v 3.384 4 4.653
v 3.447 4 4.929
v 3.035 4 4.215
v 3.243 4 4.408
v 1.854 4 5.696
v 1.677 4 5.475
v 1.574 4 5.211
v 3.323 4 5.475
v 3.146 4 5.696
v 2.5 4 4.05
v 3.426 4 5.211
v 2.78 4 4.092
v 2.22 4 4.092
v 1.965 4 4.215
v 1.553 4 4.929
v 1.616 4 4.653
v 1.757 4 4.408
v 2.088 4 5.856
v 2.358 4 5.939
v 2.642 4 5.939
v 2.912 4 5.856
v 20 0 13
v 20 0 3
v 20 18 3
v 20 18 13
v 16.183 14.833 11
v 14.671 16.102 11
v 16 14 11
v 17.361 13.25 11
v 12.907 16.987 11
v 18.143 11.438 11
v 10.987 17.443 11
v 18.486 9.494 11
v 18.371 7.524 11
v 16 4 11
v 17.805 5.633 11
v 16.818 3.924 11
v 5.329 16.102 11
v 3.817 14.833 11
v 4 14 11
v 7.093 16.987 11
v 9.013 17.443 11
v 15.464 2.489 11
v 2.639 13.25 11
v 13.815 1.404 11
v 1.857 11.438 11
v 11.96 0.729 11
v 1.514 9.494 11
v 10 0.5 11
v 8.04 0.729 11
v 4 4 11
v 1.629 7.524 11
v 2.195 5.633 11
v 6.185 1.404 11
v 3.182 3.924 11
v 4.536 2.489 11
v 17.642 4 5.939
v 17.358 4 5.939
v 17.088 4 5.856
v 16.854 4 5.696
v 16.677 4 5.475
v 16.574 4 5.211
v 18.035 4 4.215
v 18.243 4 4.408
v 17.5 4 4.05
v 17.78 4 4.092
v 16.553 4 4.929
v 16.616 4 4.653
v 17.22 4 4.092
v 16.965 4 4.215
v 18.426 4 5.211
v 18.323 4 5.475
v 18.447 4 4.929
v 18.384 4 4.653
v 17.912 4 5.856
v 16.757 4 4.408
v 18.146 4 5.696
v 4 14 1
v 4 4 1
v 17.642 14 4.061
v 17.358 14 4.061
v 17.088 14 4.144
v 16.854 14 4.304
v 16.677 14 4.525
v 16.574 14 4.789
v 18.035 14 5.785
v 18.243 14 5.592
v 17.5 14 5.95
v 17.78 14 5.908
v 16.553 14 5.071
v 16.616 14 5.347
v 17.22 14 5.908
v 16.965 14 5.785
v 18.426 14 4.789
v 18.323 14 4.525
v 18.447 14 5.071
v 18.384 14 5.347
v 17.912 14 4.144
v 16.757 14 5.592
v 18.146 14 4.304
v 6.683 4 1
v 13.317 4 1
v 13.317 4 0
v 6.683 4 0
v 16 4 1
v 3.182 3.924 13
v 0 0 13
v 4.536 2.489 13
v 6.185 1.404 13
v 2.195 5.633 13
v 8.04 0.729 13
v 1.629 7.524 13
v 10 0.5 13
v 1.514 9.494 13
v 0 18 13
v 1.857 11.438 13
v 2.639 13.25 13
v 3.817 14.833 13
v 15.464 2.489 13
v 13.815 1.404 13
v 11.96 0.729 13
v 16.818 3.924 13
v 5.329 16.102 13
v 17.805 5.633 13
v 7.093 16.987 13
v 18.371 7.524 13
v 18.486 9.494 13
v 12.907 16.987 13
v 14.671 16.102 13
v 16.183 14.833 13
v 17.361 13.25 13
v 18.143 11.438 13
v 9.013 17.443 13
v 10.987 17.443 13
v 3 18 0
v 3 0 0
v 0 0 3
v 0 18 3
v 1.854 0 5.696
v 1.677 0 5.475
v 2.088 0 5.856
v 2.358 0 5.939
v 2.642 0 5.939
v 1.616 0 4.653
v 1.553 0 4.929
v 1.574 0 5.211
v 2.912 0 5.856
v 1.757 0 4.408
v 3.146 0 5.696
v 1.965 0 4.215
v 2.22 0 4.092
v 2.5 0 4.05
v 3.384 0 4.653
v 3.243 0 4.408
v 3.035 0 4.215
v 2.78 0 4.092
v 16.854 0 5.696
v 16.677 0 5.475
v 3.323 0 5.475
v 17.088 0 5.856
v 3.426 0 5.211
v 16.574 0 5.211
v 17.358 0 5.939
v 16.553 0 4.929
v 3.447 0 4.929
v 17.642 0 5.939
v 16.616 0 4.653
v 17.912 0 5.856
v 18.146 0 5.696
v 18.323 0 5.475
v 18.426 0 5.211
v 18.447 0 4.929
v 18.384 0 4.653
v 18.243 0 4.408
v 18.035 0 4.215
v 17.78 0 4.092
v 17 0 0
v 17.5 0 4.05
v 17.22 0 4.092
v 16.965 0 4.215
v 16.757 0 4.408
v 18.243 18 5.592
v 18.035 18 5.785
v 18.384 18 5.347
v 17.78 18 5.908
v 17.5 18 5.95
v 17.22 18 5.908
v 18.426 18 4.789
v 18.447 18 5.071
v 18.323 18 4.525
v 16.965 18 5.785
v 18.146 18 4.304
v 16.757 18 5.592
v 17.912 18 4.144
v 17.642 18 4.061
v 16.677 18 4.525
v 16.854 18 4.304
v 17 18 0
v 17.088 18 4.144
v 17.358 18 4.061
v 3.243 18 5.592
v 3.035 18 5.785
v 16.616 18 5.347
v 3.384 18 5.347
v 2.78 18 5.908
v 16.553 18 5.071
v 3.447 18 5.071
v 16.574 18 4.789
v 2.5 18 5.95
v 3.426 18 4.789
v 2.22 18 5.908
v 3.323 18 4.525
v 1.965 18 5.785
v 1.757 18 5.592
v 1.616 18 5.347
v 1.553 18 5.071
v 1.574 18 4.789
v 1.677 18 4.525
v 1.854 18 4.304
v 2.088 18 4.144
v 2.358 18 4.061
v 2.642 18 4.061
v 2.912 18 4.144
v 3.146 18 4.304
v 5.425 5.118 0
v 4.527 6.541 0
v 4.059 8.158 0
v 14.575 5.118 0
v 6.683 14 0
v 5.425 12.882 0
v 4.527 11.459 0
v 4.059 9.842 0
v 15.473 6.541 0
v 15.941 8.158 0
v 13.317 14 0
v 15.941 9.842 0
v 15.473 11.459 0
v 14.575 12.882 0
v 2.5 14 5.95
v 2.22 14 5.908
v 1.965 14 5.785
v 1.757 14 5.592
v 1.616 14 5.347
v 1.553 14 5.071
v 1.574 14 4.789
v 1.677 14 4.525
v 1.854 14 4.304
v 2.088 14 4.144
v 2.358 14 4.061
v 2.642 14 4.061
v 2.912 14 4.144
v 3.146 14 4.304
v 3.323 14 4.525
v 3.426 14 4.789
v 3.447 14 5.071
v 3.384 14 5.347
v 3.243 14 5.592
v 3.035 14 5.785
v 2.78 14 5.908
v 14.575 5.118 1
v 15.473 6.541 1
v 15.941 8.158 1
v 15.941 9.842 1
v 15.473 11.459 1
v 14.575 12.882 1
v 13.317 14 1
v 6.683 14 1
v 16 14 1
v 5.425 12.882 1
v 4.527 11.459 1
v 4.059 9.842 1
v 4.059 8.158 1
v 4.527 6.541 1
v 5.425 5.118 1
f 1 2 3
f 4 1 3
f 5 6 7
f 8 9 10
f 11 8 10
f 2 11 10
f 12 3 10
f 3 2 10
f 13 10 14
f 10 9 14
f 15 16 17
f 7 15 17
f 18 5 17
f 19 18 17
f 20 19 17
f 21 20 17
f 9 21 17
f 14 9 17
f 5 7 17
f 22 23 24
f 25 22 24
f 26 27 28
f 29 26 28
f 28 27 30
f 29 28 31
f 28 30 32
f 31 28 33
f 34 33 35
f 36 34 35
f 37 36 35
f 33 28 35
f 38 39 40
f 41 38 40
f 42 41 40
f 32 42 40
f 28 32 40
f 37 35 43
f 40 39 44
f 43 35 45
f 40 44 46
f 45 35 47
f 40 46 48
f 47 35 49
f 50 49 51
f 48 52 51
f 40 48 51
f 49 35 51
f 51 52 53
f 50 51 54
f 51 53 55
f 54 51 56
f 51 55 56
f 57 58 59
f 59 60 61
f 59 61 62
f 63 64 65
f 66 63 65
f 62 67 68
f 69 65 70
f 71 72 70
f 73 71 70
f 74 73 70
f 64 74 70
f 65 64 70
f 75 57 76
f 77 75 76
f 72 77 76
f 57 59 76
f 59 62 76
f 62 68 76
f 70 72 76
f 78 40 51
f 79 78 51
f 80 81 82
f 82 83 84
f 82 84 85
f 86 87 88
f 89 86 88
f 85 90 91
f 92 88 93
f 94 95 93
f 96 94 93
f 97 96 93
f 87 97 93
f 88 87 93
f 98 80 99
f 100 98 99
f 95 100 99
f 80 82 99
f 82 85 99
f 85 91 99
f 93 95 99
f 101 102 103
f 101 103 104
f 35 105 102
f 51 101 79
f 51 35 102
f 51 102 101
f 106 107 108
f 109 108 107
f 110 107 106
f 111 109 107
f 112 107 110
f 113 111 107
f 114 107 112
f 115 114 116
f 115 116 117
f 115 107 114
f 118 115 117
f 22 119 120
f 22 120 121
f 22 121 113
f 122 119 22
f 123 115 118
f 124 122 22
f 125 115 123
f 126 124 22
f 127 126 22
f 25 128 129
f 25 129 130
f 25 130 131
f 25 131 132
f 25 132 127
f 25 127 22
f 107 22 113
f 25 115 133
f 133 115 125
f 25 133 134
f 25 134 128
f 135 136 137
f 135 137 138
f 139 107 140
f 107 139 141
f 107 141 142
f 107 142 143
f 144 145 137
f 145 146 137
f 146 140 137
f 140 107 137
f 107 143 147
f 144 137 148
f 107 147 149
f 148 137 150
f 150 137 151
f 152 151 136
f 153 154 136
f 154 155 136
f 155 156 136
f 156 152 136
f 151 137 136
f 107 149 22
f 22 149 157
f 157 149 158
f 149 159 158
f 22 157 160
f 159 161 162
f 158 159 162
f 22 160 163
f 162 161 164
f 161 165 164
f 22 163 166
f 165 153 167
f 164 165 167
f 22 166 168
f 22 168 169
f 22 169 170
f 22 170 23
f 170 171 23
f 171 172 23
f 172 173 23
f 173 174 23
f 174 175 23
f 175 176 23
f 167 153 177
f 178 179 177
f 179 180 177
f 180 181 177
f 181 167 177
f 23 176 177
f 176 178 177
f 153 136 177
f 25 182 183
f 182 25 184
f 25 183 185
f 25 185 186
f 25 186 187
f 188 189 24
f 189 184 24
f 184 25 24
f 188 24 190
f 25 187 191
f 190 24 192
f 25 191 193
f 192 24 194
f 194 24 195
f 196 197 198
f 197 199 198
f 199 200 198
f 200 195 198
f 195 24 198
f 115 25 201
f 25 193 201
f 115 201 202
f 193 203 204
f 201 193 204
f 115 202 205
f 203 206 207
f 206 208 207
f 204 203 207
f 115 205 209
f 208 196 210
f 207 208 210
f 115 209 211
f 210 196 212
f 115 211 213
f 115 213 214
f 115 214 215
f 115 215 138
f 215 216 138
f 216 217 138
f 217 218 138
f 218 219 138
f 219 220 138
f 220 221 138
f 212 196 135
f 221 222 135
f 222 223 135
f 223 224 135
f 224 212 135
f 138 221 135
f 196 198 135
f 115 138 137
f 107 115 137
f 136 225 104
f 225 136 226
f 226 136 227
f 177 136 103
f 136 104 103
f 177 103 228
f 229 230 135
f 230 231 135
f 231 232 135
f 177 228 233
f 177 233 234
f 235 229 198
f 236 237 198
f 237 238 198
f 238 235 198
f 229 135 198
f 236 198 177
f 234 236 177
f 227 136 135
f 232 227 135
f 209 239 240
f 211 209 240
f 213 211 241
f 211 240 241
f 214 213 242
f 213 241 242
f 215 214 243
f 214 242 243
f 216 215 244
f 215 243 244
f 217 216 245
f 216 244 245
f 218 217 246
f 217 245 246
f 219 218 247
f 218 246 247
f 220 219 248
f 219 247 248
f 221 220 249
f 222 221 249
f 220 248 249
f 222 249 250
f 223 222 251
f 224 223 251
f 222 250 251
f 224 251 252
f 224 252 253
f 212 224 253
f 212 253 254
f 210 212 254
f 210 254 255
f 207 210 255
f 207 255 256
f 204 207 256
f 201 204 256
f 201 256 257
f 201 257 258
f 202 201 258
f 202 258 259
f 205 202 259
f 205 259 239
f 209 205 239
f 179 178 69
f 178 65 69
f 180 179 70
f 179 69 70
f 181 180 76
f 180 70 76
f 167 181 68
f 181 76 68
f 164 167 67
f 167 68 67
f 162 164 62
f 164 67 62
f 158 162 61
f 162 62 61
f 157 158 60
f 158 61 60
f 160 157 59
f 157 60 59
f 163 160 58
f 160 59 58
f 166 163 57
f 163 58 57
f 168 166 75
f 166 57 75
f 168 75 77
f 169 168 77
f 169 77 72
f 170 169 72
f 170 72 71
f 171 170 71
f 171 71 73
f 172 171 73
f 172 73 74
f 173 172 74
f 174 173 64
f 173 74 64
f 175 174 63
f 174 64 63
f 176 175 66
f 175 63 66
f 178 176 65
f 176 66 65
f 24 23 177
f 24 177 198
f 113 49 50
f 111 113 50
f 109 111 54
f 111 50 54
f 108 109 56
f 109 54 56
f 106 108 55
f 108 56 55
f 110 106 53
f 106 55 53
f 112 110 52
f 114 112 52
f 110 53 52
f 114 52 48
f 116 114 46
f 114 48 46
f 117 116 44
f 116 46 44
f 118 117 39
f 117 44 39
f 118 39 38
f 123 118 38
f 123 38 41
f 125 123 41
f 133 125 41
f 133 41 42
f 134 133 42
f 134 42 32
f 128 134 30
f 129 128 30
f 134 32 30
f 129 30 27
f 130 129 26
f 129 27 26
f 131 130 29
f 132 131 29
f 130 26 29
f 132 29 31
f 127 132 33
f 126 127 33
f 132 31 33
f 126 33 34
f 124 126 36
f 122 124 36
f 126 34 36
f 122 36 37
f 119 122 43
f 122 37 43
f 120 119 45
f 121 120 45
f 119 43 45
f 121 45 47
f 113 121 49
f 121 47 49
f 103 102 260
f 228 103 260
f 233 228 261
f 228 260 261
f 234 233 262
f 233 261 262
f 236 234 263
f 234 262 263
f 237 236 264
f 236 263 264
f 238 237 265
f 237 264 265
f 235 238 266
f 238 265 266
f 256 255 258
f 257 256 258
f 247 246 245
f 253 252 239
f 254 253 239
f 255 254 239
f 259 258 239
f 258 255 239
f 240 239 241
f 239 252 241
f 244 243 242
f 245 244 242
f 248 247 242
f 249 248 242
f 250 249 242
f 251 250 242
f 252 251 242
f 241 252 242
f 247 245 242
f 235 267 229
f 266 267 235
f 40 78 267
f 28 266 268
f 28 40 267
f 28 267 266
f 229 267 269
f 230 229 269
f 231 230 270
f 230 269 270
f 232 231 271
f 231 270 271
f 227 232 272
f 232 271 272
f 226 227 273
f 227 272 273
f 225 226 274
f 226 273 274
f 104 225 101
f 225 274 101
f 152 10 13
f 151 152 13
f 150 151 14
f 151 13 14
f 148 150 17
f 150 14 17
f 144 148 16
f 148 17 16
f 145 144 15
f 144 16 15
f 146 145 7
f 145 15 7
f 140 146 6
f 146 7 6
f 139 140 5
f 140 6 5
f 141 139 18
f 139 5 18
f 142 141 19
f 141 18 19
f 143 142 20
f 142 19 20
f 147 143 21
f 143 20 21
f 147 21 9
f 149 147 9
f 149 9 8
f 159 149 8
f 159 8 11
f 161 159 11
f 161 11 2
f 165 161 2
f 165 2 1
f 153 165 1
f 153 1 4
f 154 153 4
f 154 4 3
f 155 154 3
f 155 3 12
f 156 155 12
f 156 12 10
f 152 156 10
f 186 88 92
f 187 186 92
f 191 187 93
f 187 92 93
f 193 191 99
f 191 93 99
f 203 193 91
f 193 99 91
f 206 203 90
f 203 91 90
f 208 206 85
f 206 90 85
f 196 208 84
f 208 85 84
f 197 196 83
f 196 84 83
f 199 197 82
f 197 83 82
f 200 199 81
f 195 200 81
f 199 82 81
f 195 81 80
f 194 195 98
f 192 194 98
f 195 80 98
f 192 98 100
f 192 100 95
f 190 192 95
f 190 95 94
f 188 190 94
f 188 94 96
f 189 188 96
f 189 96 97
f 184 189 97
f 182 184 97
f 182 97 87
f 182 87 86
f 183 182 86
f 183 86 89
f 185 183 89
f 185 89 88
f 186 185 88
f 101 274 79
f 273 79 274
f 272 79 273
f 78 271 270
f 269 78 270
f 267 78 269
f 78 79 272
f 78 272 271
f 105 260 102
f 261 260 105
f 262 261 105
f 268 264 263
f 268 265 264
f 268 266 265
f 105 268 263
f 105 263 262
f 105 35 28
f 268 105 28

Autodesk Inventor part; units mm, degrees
ref_plane "YZ Plane" through (0, 0, 0) normal (1, 0, 0) x (0, 1, 0)
ref_plane "XZ Plane" through (0, 0, 0) normal (0, 1, 0) x (-1, 0, 0)
ref_plane "XY Plane" through (0, 0, 0) normal (0, 0, 1) x (1, 0, 0)
sketch "Sketch1" plane through (0, 0, 0) normal (0, 0, 1) x (1, 0, 0)
  line L0 (0, 0) -> (20, 0)
  line L1 (20, 0) -> (20, 18)
  line L2 (20, 18) -> (0, 18)
  line L3 (0, 18) -> (0, 0)
  dimension "d0" = 20
  dimension "d1" = 18
extrude "body" add sketch "Sketch1" along normal blind 13
sketch "Sketch2" plane through (0, 18, 0) normal (0, 1, 0) x (1, 0, 0)
  line L0 (20, 0) -> (0, 0) projected
  point P0 (2.5, -5)
  point P1 (17.5, -5)
  dimension "d4" = 2.5
  dimension "d5" = 2.5
  dimension "d6" = 5
  dimension "d7" = 5
hole "top mount" at (2.5, 18, 5) at (17.5, 18, 5) direction (0, -1, 0) diameter 1.9 depth 4
sketch "Sketch3" plane through (0, 0, 0) normal (0, -1, 0) x (1, 0, 0)
  line L0 (0, 0) -> (20, 0) projected
  point P0 (17.5, 5)
  point P1 (2.5, 5)
  dimension "d15" = 5
  dimension "d16" = 5
  dimension "d17" = 2.5
  dimension "d18" = 2.5
hole "bottom mount" at (17.5, 0, 5) at (2.5, 0, 5) direction (0, 1, 0) diameter 1.9 depth 4
sketch "Sketch4" plane through (0, 0, 13) normal (0, 0, 1) x (1, 0, 0)
  point P0 (0, 0)
  point P1 (0, 18)
  point P2 (10, 9)
  dimension "d26" = 10
  dimension "d27" = 9
hole "spool" at (10, 9, 13) direction (0, 0, -1) diameter 17 depth 2
sketch "Sketch5" plane through (0, 0, 13) normal (0, 0, 1) x (1, 0, 0)
  line L0 (4, 4) -> (16, 4)
  line L1 (16, 4) -> (16, 14)
  line L2 (16, 14) -> (4, 14)
  line L3 (4, 14) -> (4, 4)
  line L4 (4, 4) -> (16, 14) construction
  line L5 (16, 4) -> (4, 14) construction
  point P0 (0, 0)
  point P1 (10, 9)
  dimension "d35" = 12
  dimension "d36" = 10
extrude "gearbox pocket" cut sketch "Sketch5" against normal blind 12
sketch "Sketch6" plane through (0, 0, 1) normal (0, 0, 1) x (1, 0, 0)
  line L0 (13.3166, 4) -> (6.6834, 4)
  line L1 (6.6834, 4) -> (6.6834, 14)
  line L2 (6.6834, 14) -> (13.3166, 14)
  line L3 (13.3166, 14) -> (13.3166, 4)
  line L4 (13.3166, 4) -> (6.6834, 14) construction
  line L5 (6.6834, 4) -> (13.3166, 14) construction
  arc A0 (13.3166, 4) -> (13.3166, 14) centre (10, 9) ccw
  arc A1 (6.6834, 4) -> (13.3166, 4) centre (10, 9) ccw construction
  arc A2 (13.3166, 14) -> (6.6834, 14) centre (10, 9) ccw construction
  arc A3 (6.6834, 14) -> (6.6834, 4) centre (10, 9) ccw
  dimension "d46" = 12
  dimension "d47" = 10
extrude "Extrusion3" cut sketch "Sketch6" against normal through all
chamfer "Chamfer1" distance 3 angle 45 2 edges at (0, 9, 0) (20, 9, 0)
properties part number "drive R"
